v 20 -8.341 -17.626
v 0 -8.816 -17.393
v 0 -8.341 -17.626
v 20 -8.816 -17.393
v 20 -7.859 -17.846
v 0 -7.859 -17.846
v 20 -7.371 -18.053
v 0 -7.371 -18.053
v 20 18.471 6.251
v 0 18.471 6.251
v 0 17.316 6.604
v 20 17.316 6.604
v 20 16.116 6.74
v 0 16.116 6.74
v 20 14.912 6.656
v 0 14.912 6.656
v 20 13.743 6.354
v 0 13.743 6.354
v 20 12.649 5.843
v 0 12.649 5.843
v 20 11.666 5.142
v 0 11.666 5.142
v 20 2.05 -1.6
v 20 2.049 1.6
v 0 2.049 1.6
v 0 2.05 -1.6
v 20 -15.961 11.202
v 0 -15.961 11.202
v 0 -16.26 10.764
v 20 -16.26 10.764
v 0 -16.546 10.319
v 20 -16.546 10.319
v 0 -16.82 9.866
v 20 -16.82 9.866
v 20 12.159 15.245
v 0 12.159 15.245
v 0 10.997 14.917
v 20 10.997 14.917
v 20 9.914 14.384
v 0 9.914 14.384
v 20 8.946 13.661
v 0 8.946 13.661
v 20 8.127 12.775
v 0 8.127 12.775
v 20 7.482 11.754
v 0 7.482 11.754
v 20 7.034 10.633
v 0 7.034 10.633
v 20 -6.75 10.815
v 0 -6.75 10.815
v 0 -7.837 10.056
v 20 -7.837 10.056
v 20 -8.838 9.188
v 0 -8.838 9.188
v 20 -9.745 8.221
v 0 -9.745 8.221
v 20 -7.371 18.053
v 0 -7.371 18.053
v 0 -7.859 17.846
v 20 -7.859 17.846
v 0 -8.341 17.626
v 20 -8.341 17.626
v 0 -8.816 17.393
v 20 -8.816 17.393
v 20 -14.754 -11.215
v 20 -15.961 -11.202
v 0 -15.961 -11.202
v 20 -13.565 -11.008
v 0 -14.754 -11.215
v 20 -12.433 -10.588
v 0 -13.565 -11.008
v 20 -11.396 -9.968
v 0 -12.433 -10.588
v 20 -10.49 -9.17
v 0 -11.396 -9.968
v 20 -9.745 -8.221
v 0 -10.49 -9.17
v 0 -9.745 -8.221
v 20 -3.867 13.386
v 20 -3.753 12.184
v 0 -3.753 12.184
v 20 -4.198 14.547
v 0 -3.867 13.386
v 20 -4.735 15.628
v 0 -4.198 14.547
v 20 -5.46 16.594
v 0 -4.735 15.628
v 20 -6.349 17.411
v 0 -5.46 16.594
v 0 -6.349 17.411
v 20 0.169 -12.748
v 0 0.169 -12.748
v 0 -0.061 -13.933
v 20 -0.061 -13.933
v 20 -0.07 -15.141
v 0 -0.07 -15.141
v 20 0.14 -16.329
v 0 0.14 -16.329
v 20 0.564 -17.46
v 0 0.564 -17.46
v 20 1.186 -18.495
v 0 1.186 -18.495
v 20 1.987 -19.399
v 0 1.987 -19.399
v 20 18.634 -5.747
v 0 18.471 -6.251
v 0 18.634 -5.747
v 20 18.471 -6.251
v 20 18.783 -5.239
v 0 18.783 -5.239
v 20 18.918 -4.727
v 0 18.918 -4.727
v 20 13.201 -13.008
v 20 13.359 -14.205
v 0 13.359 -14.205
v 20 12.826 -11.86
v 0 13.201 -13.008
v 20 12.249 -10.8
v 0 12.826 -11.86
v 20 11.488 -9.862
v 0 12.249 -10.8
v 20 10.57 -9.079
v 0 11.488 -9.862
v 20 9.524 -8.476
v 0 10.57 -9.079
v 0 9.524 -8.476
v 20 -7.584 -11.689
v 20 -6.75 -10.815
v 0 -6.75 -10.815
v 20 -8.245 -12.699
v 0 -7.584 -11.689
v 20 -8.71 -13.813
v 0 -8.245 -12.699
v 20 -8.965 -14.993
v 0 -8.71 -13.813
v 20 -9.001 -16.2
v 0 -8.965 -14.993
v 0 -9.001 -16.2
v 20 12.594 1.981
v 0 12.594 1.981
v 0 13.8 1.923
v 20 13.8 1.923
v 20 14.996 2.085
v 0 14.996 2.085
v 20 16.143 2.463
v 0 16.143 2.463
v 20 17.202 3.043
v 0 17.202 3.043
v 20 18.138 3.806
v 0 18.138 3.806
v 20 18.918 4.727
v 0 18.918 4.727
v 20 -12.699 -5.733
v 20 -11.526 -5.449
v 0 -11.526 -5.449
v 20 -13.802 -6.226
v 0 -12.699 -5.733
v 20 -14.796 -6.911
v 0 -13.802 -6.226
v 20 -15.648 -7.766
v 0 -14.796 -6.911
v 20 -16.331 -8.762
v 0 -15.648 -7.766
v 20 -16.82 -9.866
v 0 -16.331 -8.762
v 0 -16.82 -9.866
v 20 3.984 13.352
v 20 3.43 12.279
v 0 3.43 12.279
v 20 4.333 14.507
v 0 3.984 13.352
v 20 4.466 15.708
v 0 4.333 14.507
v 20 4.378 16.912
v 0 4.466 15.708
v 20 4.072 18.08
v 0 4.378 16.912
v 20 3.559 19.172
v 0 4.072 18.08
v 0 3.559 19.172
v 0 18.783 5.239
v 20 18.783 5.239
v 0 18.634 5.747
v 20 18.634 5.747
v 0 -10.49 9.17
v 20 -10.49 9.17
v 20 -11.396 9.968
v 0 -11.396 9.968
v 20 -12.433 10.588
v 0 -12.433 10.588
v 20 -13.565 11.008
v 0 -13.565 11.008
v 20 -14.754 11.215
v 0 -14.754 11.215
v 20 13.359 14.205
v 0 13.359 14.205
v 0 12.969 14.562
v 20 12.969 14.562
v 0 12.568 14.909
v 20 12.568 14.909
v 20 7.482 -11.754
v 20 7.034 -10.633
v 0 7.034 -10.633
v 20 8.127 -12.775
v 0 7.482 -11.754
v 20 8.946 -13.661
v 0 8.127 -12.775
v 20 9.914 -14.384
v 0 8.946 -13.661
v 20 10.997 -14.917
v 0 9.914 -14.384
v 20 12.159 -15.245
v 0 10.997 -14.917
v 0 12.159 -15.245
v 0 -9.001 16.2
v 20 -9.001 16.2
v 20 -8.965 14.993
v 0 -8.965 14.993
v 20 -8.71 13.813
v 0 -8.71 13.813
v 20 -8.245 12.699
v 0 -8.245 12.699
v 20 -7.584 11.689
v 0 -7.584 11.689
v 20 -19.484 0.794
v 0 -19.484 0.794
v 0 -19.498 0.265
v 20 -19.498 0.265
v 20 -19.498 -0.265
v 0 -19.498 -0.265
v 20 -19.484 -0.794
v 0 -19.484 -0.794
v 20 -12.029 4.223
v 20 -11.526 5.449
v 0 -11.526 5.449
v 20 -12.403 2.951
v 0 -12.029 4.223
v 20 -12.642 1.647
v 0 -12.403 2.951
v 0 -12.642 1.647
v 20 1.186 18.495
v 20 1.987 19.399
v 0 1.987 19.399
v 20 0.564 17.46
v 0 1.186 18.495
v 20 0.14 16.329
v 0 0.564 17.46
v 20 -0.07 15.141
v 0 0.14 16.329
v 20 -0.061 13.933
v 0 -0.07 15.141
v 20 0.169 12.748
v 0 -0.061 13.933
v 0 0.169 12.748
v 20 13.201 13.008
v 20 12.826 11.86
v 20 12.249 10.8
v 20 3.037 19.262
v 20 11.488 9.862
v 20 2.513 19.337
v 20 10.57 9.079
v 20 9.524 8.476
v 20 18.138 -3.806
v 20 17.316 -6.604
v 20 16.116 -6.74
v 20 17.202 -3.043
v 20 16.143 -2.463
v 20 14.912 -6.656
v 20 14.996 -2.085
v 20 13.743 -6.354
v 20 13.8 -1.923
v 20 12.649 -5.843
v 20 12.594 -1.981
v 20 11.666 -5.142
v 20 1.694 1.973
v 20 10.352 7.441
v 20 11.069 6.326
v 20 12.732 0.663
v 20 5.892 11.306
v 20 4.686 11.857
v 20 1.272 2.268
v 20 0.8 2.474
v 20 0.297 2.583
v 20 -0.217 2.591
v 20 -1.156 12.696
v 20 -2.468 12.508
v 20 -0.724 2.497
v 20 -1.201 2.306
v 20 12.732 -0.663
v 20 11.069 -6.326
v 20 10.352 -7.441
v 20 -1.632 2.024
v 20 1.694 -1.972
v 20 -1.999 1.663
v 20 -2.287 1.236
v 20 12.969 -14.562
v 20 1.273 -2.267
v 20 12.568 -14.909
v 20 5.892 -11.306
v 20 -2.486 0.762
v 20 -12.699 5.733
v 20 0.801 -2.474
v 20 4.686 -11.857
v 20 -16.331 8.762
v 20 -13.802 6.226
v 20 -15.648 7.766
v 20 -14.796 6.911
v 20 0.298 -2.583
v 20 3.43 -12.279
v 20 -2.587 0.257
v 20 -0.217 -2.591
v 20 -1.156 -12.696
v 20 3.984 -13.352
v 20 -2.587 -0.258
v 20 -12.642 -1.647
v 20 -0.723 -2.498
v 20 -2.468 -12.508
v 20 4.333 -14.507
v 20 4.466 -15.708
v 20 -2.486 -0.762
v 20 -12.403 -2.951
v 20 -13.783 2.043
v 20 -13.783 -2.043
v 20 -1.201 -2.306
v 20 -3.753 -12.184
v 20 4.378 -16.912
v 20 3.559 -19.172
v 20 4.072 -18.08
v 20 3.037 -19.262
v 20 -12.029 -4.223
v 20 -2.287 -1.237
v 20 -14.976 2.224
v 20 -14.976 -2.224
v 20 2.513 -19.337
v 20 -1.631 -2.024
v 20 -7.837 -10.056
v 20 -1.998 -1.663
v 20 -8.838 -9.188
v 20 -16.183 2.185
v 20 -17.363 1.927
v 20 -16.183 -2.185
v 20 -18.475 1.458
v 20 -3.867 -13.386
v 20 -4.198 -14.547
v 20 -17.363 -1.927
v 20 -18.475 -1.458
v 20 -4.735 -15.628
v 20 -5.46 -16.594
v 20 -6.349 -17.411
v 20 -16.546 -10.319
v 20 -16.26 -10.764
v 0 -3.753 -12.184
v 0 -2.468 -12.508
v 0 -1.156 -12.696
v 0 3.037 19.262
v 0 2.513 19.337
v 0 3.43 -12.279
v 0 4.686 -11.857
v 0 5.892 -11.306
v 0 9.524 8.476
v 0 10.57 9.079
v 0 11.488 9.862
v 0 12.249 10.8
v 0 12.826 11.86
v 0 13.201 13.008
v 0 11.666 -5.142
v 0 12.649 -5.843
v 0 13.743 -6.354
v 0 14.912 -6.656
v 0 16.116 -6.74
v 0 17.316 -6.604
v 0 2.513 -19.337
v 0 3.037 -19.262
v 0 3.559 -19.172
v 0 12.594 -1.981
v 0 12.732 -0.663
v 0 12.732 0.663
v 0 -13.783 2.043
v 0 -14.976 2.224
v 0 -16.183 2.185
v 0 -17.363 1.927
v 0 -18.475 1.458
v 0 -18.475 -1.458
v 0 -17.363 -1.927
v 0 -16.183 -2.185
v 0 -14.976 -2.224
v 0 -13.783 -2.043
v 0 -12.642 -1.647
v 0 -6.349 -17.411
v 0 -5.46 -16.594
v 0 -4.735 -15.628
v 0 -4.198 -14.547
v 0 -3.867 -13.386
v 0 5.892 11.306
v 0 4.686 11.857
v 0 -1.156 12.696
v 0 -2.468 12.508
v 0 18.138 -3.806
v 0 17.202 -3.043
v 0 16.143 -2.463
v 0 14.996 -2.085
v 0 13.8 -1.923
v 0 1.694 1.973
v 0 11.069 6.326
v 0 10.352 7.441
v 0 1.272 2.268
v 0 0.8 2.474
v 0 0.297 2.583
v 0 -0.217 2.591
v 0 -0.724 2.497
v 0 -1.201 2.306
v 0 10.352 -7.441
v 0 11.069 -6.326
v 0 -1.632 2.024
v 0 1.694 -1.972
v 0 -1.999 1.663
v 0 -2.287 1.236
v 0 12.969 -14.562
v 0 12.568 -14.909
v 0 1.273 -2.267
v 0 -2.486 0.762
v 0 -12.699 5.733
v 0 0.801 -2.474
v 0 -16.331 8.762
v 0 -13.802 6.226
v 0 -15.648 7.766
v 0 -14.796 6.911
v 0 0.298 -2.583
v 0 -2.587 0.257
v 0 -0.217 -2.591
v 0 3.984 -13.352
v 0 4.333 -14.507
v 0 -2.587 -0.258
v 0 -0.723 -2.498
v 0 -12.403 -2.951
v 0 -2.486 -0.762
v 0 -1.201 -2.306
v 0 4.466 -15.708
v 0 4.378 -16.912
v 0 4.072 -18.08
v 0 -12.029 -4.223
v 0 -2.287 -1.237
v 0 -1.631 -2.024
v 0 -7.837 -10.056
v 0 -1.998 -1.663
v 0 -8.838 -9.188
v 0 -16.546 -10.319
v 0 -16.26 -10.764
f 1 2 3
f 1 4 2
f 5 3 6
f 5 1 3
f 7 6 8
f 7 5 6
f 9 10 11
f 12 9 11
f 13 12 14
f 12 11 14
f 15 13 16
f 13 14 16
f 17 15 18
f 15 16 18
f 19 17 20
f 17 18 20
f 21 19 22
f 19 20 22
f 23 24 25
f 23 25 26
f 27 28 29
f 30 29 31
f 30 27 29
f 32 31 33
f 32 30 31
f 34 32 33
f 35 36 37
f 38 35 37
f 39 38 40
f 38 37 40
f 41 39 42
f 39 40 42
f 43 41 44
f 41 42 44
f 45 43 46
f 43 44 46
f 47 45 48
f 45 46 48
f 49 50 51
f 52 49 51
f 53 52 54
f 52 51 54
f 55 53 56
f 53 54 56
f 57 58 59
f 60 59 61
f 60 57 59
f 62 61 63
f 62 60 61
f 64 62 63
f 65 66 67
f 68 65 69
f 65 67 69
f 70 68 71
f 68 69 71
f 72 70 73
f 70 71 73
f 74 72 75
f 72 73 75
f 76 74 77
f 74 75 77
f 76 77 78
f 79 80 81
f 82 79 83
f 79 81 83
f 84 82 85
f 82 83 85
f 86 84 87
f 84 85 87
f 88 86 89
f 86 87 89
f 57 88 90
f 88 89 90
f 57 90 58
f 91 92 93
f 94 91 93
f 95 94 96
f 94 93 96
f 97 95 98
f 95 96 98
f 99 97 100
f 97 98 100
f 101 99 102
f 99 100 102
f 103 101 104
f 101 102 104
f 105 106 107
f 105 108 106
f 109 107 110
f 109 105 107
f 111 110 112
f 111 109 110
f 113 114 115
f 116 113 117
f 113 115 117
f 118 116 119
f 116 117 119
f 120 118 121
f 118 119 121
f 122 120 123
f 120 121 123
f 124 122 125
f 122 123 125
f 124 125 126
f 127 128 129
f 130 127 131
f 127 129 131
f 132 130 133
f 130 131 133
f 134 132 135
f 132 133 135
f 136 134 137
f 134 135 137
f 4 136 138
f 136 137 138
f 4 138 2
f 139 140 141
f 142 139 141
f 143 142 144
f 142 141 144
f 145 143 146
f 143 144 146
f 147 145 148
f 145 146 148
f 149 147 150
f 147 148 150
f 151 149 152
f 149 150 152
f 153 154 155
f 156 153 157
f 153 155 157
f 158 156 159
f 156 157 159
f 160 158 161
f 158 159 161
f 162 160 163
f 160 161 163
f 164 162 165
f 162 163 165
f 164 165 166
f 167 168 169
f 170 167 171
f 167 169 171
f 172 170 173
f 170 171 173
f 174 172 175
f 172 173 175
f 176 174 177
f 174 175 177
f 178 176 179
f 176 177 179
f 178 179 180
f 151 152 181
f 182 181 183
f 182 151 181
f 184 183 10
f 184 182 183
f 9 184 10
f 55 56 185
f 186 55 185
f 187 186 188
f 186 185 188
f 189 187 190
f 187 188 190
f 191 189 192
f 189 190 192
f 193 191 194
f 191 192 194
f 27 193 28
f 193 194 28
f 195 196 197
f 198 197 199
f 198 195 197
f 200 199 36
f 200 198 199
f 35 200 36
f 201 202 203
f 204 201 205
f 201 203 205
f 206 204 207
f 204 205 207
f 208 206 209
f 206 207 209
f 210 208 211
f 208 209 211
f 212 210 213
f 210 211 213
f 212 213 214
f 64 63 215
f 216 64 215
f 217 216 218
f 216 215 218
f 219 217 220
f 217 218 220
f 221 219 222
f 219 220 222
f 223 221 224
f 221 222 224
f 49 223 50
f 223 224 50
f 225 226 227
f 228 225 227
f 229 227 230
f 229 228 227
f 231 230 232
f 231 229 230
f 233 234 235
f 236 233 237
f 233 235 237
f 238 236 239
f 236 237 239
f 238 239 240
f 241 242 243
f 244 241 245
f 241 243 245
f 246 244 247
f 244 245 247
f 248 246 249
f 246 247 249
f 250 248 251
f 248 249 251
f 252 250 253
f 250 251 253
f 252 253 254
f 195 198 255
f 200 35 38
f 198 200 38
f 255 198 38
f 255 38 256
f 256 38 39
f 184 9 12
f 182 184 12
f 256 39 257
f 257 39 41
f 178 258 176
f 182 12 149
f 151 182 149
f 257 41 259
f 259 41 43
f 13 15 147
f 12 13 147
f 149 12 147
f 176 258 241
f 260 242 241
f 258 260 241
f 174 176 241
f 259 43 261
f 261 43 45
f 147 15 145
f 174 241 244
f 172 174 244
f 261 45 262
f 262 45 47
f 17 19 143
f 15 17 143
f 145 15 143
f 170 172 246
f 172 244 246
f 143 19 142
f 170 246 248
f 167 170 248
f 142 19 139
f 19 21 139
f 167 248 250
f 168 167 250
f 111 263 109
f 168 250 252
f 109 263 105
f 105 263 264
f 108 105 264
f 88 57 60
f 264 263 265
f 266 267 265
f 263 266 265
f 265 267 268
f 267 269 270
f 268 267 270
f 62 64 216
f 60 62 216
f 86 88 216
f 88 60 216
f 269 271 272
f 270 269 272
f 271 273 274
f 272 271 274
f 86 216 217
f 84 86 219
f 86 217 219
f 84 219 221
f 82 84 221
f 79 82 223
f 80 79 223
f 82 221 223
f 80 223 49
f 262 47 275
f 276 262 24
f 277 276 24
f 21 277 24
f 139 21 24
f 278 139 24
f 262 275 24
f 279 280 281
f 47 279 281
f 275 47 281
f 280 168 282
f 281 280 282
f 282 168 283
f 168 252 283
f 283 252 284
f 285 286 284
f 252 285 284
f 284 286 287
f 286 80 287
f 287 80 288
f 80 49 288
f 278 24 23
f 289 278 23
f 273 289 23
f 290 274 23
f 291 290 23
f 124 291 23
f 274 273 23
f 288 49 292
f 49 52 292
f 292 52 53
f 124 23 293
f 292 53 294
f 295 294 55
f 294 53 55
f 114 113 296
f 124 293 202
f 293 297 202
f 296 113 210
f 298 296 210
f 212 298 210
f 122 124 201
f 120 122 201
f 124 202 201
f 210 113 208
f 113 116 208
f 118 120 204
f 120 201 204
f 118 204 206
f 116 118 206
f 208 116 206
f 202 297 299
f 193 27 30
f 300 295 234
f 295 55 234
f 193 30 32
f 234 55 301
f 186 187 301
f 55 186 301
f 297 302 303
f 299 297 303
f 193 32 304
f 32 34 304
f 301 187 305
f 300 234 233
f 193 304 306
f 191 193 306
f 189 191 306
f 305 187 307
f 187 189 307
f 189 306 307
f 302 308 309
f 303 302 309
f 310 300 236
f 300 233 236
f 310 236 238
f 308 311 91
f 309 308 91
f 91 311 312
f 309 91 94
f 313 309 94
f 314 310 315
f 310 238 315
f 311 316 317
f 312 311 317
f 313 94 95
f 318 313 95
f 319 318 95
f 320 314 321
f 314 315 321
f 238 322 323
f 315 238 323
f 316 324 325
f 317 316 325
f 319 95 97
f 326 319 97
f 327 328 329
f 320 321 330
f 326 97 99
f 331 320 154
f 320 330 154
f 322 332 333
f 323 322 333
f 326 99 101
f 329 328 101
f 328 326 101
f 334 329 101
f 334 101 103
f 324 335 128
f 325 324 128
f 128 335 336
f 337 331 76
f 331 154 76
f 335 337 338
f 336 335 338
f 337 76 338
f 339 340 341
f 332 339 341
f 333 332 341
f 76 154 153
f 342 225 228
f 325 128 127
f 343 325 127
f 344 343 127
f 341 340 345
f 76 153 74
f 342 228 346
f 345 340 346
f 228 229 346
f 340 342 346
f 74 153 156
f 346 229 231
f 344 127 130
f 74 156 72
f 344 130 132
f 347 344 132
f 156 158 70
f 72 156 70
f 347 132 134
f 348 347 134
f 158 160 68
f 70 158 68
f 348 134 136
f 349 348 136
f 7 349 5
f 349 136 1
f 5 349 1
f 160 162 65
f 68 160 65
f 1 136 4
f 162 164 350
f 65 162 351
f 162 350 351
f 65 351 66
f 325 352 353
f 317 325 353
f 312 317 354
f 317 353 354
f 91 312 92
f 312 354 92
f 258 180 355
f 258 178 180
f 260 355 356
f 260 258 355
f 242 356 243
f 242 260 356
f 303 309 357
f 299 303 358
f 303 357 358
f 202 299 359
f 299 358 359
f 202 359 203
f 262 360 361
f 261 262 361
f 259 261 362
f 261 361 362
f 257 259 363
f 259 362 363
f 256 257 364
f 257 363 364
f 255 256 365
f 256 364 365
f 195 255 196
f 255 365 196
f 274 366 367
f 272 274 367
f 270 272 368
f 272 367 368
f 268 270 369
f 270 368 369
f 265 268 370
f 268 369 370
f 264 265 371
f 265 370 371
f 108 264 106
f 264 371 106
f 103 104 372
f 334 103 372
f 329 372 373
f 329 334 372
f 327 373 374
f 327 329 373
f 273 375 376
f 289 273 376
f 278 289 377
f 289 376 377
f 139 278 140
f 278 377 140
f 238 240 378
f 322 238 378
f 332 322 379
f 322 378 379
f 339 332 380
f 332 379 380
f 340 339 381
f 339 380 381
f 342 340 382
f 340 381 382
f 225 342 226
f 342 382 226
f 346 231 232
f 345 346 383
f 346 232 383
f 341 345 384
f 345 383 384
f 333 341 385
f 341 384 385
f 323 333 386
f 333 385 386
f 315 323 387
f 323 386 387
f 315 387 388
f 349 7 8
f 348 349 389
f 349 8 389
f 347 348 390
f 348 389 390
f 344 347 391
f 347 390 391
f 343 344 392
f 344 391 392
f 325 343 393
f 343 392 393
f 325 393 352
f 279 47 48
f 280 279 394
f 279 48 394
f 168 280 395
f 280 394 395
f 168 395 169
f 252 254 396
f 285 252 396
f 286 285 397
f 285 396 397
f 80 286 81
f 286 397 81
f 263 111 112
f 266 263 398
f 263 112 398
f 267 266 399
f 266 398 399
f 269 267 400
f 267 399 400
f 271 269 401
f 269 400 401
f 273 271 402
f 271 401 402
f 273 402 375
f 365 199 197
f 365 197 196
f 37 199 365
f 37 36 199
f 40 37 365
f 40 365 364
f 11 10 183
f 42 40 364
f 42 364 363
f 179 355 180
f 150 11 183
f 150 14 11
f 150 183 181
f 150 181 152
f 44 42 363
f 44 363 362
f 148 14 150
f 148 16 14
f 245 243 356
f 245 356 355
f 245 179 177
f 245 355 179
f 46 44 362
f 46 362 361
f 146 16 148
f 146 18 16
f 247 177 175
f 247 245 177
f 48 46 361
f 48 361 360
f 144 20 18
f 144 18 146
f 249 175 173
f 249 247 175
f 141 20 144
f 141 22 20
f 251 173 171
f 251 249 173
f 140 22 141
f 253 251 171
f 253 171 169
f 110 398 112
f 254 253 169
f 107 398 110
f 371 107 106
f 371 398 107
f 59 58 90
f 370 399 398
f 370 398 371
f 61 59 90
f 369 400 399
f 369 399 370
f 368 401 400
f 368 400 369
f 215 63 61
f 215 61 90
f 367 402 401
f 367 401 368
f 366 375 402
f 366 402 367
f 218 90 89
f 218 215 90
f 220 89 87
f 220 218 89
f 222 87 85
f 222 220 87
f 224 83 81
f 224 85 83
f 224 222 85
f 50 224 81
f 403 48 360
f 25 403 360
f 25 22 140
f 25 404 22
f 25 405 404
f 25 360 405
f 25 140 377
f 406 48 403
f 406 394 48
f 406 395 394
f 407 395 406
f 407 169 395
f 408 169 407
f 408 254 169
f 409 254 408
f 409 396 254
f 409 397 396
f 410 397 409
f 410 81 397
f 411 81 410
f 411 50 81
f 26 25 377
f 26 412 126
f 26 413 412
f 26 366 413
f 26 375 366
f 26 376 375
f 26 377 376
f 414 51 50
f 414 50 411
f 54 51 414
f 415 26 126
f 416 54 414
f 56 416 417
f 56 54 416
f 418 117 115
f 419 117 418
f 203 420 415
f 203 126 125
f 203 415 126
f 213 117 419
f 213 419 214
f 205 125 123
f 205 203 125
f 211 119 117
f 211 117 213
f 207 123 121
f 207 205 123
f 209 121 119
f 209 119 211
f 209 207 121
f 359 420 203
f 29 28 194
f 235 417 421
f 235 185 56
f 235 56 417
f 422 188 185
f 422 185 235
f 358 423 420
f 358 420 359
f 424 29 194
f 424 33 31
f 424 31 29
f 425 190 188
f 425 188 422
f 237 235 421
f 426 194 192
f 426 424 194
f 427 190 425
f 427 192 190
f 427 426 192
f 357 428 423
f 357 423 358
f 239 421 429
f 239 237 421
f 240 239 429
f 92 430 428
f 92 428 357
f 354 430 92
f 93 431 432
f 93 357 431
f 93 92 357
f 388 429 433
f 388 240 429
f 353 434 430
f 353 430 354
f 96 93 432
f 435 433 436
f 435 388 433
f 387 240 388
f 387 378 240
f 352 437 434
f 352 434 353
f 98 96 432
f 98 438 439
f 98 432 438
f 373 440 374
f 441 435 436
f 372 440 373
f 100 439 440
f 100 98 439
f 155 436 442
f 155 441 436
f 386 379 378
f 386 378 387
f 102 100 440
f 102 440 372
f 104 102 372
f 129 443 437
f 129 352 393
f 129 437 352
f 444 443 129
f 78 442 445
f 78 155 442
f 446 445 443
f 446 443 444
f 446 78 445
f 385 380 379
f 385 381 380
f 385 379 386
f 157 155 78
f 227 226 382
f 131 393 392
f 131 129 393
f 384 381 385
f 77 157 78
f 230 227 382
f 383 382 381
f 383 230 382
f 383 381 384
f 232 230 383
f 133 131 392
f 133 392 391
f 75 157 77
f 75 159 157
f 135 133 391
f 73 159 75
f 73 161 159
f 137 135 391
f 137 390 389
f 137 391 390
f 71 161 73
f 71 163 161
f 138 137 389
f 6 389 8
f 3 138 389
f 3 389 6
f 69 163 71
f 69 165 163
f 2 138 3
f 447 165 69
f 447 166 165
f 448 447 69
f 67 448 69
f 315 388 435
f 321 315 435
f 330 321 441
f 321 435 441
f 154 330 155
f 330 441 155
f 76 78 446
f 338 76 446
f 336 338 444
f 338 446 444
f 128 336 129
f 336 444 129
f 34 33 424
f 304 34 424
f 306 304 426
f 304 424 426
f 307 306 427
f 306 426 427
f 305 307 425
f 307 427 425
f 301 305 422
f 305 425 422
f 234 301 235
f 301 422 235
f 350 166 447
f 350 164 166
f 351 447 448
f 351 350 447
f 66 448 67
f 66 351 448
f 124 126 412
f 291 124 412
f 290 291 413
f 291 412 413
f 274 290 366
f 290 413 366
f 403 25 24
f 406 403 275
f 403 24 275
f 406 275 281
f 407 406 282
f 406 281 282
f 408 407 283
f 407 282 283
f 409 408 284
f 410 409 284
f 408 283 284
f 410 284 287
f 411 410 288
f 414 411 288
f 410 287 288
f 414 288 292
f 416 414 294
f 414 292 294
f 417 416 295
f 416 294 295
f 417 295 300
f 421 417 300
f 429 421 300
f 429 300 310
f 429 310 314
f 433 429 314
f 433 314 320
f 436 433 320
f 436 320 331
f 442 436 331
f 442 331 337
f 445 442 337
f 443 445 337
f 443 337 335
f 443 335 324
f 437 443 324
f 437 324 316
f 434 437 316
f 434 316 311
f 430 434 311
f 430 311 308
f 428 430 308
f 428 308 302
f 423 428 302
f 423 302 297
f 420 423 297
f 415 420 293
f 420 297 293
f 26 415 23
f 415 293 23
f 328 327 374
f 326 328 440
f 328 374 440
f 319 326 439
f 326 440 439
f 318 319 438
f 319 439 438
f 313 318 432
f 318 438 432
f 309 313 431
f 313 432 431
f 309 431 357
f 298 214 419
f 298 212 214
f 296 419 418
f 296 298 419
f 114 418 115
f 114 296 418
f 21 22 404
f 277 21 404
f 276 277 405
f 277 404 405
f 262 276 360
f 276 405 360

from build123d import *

# Parameters (mm, degrees)
BASPROSKE_W         = 20
BASPROSKE_H         = 19.5
TOOTHCUT_DEPTH      = 35.066112194
TEETHCUTS_COUNT     = 11
BORSKE_R            = 2.5
BORE_DEPTH          = 50.0000508
SKETCH1_R           = 2.6
CUT_EXTRUDE1_DEPTH  = 35.008132728
BOSS_EXTRUDE1_DEPTH = 20


with BuildPart() as part:
    # BasProSke → Base-Revolve (revolve)
    with BuildSketch(Plane(origin=(0, 0, 0), x_dir=(1, 0, 0), z_dir=(0, 1, 0)), mode=Mode.PRIVATE) as base_revolve_sk:
        with Locations((10, 9.75)):
            Rectangle(BASPROSKE_W, BASPROSKE_H)
    revolve(base_revolve_sk.sketch.rotate(Axis((-10, 0, 0), (1, 0, 0)), 180), axis=Axis((-10, 0, 0), (1, 0, 0)))

    # TooCutSke → ToothCut (cut, through all)
    with BuildSketch(Plane(origin=(0, 0, 0), x_dir=(0, 0, -1), z_dir=(1, 0, 0))):
        with BuildLine():
            ThreePointArc((1.981256207, 12.594110721), (0, 12.749), (-1.981256207, 12.594110721))
            ThreePointArc((-1.981256207, 12.594110721), (-2.46948003, 16.158725125), (-4.75478191, 18.937615852))
            ThreePointArc((-4.75478191, 18.937615852), (0, 19.5254), (4.75478191, 18.937615852))
            ThreePointArc((4.75478191, 18.937615852), (2.46948003, 16.158725125), (1.981256207, 12.594110721))
        make_face()
    toothcut = extrude(amount=TOOTHCUT_DEPTH, mode=Mode.SUBTRACT)

    # TeethCuts: ToothCut ×11 about axis
    teethcuts_axis = Axis((0, 0, 0), (1, 0, 0))
    for i in range(1, TEETHCUTS_COUNT):
        add(toothcut.rotate(teethcuts_axis, i * 360 / TEETHCUTS_COUNT), mode=Mode.SUBTRACT)

    # BorSke → Bore (cut, symmetric)
    with BuildSketch(Plane(origin=(0, 0, 0), x_dir=(0, 0, -1), z_dir=(1, 0, 0))):
        with Locations(Location((0, 0, 0), (0, 0, 180))):
            Circle(BORSKE_R)
    extrude(amount=BORE_DEPTH, both=True, mode=Mode.SUBTRACT)

    # Sketch1 → Cut-Extrude1 (cut, through all)
    with BuildSketch(Plane(origin=(20, 0, 0), x_dir=(0, 0, -1), z_dir=(1, 0, 0))):
        Circle(SKETCH1_R)
    extrude(amount=-CUT_EXTRUDE1_DEPTH, mode=Mode.SUBTRACT)

    # Sketch2 → Boss-Extrude1 (add, through all)
    with BuildSketch(Plane(origin=(20, 0, 0), x_dir=(0, 0, -1), z_dir=(1, 0, 0))):
        with BuildLine():
            Line((-1.600307301, 2.0491502), (1.599692663, 2.04963006))
            ThreePointArc((1.599692663, 2.04963006), (-0.000389886, 2.599999971), (-1.600307301, 2.0491502))
        make_face()
    extrude(amount=-BOSS_EXTRUDE1_DEPTH)


solid = part.part
